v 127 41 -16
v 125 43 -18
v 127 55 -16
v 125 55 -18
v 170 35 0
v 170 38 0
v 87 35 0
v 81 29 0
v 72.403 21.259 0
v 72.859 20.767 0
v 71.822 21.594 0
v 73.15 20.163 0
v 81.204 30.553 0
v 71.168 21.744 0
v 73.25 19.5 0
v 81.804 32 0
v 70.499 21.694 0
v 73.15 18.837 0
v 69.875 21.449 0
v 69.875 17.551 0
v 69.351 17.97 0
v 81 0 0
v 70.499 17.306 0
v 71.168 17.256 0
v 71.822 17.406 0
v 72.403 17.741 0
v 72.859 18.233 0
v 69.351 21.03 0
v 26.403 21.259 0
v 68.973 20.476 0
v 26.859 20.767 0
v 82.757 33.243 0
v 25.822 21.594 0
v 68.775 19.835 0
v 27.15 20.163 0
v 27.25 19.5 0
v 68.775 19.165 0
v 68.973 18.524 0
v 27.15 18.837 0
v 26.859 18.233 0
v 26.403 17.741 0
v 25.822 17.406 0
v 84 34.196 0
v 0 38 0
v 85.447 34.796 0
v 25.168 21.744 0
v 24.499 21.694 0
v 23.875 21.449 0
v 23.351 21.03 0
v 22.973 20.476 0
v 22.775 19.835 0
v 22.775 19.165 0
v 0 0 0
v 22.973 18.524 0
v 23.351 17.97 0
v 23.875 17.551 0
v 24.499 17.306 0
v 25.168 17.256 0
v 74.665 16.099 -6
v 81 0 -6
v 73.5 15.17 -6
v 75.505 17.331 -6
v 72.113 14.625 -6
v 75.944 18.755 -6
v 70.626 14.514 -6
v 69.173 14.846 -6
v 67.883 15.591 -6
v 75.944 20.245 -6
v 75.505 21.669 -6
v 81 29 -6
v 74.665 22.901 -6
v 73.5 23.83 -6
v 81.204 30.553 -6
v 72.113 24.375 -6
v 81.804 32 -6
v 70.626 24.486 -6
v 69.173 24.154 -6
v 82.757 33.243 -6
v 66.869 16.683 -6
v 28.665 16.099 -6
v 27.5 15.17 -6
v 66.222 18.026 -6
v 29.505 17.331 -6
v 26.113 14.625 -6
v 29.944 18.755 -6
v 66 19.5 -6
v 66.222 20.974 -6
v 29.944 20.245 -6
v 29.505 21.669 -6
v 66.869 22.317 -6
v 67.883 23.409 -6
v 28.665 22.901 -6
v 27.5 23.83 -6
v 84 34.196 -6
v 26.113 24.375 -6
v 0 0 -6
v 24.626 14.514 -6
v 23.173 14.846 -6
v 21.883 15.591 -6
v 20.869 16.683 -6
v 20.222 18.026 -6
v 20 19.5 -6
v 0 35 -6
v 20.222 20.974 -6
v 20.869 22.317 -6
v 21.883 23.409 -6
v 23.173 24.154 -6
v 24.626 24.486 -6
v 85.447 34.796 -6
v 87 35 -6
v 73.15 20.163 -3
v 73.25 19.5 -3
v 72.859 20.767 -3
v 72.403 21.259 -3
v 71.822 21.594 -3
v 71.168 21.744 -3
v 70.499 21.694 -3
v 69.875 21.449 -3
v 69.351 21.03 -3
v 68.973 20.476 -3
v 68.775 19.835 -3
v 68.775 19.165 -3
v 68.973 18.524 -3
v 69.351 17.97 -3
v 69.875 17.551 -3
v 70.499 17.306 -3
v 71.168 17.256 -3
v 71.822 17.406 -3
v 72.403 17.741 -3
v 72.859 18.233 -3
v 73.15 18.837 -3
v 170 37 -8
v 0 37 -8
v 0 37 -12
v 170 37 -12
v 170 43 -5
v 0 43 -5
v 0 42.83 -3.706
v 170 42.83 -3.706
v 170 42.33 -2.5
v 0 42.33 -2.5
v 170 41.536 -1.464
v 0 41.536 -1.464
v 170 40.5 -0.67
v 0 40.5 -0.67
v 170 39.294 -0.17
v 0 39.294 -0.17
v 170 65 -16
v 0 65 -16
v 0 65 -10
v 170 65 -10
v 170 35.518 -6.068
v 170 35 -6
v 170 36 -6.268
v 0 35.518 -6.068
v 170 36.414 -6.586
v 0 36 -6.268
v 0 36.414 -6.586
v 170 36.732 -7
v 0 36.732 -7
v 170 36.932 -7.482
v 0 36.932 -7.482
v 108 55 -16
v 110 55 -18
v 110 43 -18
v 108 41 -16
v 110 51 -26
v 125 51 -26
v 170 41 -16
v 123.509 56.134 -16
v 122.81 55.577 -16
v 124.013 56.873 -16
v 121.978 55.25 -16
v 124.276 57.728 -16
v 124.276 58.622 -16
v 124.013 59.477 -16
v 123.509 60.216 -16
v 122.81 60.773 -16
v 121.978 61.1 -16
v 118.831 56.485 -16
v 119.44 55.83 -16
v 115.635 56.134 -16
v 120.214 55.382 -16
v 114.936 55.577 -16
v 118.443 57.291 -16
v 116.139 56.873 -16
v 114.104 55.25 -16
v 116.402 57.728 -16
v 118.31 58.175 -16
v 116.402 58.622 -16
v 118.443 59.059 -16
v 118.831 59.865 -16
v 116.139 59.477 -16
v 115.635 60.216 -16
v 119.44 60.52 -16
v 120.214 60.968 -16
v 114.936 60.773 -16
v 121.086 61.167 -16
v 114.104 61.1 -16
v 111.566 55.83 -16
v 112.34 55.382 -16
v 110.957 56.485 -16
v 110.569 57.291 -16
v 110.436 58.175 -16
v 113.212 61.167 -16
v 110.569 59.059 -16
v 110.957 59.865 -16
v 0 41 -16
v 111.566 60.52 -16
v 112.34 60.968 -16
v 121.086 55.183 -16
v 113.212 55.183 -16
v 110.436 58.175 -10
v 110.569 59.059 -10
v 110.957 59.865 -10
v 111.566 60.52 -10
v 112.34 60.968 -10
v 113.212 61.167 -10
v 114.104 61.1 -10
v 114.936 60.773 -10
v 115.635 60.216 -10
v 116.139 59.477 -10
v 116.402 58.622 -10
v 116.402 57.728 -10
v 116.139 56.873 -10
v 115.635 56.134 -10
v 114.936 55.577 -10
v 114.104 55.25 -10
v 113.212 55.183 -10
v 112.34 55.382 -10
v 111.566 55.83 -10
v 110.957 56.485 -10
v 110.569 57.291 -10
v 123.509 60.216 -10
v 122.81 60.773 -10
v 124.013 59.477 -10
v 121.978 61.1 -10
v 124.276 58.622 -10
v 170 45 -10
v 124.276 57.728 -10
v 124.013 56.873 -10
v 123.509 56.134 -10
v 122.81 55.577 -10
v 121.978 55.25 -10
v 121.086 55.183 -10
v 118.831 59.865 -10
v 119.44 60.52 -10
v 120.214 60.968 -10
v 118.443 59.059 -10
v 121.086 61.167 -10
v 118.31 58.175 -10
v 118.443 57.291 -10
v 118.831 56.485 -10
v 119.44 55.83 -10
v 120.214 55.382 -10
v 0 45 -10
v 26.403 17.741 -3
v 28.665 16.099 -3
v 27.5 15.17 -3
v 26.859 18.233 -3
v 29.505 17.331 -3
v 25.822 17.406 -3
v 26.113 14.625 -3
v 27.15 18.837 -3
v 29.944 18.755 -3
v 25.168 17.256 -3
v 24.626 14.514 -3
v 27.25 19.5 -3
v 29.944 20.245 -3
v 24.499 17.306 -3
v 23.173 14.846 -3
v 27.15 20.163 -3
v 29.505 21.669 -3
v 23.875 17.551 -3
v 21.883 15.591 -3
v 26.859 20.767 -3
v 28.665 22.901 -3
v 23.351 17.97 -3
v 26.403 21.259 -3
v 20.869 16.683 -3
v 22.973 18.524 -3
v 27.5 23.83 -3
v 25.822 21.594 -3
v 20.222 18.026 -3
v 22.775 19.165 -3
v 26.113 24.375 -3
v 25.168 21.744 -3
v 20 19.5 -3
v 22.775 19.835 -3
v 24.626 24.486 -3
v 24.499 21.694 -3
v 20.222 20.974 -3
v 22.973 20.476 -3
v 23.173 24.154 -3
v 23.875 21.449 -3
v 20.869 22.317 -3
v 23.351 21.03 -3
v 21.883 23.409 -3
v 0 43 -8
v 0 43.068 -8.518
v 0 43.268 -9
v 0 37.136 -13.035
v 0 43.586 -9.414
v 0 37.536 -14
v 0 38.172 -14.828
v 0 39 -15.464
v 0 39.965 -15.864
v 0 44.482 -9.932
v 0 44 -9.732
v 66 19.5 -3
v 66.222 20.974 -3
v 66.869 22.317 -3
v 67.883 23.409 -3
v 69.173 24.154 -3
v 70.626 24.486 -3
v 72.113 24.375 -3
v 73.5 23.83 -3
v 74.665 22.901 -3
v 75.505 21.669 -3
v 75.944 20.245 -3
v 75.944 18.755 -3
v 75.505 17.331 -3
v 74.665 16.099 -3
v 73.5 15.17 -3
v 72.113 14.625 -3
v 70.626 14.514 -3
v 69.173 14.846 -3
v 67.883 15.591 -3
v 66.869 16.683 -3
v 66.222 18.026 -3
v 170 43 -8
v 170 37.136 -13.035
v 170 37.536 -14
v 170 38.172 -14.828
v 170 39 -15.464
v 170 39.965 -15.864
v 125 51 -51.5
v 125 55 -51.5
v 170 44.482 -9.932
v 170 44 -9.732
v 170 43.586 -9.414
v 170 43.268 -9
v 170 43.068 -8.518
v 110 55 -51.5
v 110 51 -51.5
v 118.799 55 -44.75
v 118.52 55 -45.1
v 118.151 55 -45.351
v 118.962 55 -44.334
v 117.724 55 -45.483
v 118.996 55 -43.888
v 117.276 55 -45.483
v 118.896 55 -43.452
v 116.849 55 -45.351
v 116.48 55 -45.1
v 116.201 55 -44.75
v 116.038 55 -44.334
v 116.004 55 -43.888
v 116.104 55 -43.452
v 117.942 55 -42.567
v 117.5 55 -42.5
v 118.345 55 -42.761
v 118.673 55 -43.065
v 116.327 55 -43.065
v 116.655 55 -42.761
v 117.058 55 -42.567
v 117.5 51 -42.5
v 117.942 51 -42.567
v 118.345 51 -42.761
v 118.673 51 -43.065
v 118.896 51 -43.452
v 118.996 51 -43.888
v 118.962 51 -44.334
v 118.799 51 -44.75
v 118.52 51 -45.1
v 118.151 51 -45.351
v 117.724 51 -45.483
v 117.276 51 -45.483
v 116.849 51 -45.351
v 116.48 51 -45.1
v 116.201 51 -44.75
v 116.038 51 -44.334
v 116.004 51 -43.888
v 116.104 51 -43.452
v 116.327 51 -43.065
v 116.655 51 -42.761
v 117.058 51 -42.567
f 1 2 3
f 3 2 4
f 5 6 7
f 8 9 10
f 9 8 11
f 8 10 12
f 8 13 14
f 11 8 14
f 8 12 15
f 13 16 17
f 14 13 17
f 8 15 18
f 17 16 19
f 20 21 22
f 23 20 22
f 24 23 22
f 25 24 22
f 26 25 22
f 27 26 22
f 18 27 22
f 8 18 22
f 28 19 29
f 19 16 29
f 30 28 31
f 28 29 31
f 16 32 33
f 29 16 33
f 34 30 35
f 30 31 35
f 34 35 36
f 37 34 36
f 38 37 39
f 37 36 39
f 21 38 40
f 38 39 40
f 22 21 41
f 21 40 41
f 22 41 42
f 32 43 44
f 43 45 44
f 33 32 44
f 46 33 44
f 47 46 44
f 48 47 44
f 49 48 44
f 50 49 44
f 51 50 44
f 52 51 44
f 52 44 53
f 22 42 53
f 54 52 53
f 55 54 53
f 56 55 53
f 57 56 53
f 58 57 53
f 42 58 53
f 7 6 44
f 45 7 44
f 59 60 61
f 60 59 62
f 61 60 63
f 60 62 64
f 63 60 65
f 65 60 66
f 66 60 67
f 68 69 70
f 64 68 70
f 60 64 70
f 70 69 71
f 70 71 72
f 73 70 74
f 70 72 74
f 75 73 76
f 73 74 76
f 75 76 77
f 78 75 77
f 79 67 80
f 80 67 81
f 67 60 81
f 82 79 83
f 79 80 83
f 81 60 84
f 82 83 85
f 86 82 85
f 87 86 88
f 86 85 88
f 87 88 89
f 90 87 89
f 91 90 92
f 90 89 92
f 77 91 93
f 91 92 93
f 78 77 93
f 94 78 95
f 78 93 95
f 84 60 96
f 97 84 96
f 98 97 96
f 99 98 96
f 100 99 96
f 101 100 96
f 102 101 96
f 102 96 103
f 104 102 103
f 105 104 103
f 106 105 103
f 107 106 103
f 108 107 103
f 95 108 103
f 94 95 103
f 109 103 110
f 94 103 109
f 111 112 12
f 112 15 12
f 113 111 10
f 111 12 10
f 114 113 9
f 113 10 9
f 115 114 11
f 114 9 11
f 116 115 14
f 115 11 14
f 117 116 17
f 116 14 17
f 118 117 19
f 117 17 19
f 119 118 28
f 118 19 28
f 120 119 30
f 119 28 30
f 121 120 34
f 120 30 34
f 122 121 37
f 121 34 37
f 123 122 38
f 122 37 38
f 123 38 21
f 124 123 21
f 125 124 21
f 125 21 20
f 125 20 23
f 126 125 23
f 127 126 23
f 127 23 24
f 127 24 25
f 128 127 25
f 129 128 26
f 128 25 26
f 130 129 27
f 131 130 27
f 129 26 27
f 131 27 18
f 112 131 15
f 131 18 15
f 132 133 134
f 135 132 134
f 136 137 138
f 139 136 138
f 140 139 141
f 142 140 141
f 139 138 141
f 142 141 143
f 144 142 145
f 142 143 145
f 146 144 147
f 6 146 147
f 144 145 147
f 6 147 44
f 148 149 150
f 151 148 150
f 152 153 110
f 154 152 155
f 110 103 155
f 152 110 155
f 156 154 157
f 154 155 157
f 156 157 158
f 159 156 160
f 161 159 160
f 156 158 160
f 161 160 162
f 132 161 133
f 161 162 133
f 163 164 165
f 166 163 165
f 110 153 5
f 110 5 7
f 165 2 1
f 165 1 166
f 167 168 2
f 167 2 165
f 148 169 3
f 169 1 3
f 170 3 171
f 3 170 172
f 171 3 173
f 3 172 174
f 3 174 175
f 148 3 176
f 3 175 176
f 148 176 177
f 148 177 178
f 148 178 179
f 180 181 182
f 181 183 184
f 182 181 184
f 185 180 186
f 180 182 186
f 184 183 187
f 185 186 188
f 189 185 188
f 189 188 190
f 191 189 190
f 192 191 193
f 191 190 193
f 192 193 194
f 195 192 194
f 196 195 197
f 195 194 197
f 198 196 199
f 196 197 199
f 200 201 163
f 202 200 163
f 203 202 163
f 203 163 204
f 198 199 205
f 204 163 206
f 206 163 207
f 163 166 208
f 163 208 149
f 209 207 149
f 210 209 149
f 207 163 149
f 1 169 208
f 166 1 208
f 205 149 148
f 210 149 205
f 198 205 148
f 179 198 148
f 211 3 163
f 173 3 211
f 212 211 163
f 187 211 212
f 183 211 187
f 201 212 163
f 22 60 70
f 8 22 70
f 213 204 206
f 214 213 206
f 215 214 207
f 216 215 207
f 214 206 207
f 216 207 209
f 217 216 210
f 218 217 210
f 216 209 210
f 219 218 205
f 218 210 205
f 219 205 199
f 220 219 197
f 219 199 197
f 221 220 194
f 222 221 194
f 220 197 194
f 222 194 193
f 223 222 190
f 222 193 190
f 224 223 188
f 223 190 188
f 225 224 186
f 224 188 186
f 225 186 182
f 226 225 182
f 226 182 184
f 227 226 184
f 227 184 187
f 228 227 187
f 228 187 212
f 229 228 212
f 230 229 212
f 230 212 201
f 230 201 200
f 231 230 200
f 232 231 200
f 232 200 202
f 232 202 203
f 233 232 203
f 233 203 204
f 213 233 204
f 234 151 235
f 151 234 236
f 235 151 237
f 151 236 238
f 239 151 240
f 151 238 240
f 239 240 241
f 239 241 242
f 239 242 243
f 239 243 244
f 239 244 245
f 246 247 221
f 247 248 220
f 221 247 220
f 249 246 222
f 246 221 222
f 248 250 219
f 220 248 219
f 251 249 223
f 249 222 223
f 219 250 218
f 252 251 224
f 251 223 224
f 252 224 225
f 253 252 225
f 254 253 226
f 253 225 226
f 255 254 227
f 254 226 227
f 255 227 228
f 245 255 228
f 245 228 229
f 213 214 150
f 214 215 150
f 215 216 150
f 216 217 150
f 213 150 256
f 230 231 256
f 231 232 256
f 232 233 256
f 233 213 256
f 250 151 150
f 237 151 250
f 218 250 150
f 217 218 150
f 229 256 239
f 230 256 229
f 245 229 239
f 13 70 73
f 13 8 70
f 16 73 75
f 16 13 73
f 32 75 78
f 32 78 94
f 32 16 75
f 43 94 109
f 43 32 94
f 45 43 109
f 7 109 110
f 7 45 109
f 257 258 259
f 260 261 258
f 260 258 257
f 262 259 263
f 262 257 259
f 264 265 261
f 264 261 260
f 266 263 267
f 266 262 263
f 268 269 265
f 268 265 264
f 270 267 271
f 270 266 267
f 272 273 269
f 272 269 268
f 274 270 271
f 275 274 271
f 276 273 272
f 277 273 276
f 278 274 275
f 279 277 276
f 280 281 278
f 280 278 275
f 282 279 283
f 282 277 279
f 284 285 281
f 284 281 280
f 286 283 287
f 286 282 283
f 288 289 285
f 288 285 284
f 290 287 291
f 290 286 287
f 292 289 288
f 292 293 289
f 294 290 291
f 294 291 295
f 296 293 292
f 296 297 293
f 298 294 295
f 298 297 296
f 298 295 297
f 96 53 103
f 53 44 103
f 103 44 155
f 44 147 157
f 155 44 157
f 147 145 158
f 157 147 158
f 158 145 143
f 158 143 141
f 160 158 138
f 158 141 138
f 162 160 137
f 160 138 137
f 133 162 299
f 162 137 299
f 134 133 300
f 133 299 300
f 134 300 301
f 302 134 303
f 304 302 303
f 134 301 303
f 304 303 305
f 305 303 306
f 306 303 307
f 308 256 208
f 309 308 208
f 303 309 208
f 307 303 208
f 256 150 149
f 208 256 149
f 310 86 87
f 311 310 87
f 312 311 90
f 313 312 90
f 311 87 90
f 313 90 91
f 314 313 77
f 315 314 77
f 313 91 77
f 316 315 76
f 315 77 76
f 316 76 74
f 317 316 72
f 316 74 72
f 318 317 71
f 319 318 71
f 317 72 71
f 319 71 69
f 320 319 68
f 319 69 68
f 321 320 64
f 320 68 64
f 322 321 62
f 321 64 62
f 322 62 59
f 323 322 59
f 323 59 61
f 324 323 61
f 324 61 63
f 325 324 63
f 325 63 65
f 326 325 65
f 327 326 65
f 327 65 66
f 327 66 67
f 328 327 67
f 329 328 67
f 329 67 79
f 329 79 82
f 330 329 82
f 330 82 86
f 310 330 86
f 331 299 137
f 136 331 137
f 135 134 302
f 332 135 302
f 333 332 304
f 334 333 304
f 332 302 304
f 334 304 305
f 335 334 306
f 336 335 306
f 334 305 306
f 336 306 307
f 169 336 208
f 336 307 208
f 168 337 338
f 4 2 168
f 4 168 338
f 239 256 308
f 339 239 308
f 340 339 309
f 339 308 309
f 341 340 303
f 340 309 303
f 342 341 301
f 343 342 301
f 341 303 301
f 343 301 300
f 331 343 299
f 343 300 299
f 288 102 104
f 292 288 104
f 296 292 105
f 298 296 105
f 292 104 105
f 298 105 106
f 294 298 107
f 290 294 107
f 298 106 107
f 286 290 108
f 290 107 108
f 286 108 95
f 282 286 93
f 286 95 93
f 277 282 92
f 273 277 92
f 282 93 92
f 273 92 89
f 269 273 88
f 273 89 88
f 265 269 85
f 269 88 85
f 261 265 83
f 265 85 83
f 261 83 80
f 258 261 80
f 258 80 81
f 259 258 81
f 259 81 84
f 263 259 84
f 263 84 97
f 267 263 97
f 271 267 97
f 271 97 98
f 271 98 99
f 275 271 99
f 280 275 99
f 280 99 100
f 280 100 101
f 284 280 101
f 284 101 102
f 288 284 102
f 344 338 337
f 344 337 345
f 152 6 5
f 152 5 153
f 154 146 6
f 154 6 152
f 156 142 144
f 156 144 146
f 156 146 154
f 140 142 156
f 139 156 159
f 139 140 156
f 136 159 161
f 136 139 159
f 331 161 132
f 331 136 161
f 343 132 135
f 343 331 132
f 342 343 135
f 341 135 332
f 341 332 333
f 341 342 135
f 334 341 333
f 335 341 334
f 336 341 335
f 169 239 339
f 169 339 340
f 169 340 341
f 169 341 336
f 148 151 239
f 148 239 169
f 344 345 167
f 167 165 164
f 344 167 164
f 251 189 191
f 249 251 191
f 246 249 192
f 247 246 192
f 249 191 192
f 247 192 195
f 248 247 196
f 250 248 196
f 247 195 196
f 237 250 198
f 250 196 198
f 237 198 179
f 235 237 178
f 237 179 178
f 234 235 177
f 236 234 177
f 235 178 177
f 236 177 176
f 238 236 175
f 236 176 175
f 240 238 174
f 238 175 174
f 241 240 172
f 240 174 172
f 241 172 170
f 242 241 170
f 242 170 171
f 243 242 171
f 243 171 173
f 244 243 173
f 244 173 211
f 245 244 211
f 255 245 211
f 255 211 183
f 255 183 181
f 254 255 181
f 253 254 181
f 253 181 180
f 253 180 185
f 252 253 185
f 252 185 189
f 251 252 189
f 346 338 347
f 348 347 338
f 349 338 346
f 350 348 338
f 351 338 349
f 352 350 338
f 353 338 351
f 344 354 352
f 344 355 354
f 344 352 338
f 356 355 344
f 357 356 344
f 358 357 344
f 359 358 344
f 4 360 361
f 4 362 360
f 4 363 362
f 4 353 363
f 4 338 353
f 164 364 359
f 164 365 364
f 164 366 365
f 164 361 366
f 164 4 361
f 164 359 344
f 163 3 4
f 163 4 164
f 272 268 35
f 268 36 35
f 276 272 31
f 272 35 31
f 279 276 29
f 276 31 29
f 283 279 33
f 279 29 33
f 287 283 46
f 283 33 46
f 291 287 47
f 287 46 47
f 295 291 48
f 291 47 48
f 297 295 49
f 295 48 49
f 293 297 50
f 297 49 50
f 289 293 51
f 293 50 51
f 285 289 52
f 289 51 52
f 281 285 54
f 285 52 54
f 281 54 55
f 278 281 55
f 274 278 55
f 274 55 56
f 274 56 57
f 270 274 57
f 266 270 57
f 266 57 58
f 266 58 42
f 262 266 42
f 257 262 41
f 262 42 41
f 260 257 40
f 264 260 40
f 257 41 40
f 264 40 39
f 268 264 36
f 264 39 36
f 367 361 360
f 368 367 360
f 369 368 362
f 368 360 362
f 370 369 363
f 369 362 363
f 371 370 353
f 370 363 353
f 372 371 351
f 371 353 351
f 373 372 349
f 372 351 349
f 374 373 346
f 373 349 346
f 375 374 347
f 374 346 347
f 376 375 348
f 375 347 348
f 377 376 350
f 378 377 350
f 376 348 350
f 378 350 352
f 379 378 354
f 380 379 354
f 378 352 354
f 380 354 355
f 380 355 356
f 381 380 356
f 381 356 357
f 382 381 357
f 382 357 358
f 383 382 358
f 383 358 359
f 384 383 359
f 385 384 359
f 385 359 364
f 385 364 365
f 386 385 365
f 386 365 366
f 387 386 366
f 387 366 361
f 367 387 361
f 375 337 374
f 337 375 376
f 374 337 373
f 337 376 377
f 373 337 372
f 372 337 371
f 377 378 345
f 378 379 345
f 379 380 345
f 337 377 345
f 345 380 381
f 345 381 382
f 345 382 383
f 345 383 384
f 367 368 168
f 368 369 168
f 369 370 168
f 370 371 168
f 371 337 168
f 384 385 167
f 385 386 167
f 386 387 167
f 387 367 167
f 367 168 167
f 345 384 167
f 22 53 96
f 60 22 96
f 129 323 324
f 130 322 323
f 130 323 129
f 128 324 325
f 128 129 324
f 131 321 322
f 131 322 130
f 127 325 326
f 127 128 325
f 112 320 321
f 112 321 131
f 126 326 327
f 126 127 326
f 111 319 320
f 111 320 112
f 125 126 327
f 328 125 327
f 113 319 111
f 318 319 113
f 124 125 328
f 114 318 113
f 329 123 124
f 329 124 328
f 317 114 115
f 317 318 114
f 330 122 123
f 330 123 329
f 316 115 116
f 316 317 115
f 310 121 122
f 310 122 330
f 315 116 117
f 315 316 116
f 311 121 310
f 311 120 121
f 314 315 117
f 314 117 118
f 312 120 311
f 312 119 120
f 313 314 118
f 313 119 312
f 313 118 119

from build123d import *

# Parameters (mm, degrees)
ESTRUSIONE_ESTRUSIONE1_DEPTH                         = 170
FORO_LAMATO_PER_BULLONE_M5_A_TESTA_ESAGO_D           = 4.5
FORO_LAMATO_PER_BULLONE_M5_A_TESTA_ESAGO_DEPTH       = 30
FORO_LAMATO_PER_BULLONE_M5_A_TESTA_ESAGO_CBORE_D     = 10
FORO_LAMATO_PER_BULLONE_M5_A_TESTA_ESAGO_CBORE_DEPTH = 3
FORO_LAMATO_PER_BULLONE_M5_A_TESTA_ESAGO_TIP         = 1.351936393
SCHIZZO4_W                                           = 89
SCHIZZO4_H                                           = 35
TAGLIO_ESTRUSIONE1_DEPTH                             = 170
RACCORDO1_R                                          = 6
SCHIZZO5_W                                           = 15
SCHIZZO5_H                                           = 4
ESTRUSIONE_ESTRUSIONE2_DEPTH                         = 35.5
SCHIZZO6_R                                           = 1.5
TAGLIO_ESTRUSIONE2_DEPTH                             = 32
SCHIZZO7_R                                           = 3
TAGLIO_ESTRUSIONE3_DEPTH                             = 10
SMUSSO1_SIZE                                         = 10
SMUSSO2_SIZE                                         = 2


with BuildPart() as part:
    # Schizzo1 → Estrusione-Estrusione1 (new body)
    with BuildSketch(Plane(origin=(0, 0, 0), x_dir=(0, 0, -1), z_dir=(1, 0, 0))):
        with BuildLine():
            Line((0, 0), (6, 0))
            Line((6, 0), (6, 35))
            ThreePointArc((6, 35), (6.585786438, 36.414213562), (8, 37))
            Line((8, 37), (12, 37))
            ThreePointArc((12, 37), (14.828427125, 38.171572875), (16, 41))
            Line((16, 41), (16, 65))
            Line((16, 65), (10, 65))
            Line((10, 65), (10, 45))
            ThreePointArc((10, 45), (9.414213562, 43.585786438), (8, 43))
            Line((8, 43), (5, 43))
            ThreePointArc((5, 43), (1.464466094, 41.535533906), (0, 38))
            Line((0, 38), (0, 0))
        make_face()
    extrude(amount=ESTRUSIONE_ESTRUSIONE1_DEPTH)

    # Foro lamato per Bullone M5 a testa esagonale-1
    with Locations(Plane(origin=(0, 0, -6), x_dir=(-1, 0, 0), z_dir=(0, 0, -1))):
        with Locations((-25, 19.5), (-71, 19.5)):
            CounterBoreHole(FORO_LAMATO_PER_BULLONE_M5_A_TESTA_ESAGO_D / 2, FORO_LAMATO_PER_BULLONE_M5_A_TESTA_ESAGO_CBORE_D / 2, FORO_LAMATO_PER_BULLONE_M5_A_TESTA_ESAGO_CBORE_DEPTH, depth=FORO_LAMATO_PER_BULLONE_M5_A_TESTA_ESAGO_DEPTH)
            with Locations((0, 0, -(FORO_LAMATO_PER_BULLONE_M5_A_TESTA_ESAGO_DEPTH + FORO_LAMATO_PER_BULLONE_M5_A_TESTA_ESAGO_TIP / 2))):  # 118° drill point
                Cone(0, FORO_LAMATO_PER_BULLONE_M5_A_TESTA_ESAGO_D / 2, FORO_LAMATO_PER_BULLONE_M5_A_TESTA_ESAGO_TIP, mode=Mode.SUBTRACT)

    # Schizzo4 → Taglio-Estrusione1 (cut)
    with BuildSketch(Plane(origin=(0, 0, -6), x_dir=(-1, 0, 0), z_dir=(0, 0, -1))):
        with Locations((-125.5, 17.5)):
            Rectangle(SCHIZZO4_W, SCHIZZO4_H)
    extrude(amount=-TAGLIO_ESTRUSIONE1_DEPTH, mode=Mode.SUBTRACT)

    # Raccordo1
    raccordo1_edges = [part.edges().sort_by_distance(p)[0] for p in [
        (81, 35, -3),
    ]]
    fillet(raccordo1_edges, radius=RACCORDO1_R)

    # Schizzo5 → Estrusione-Estrusione2 (add)
    with BuildSketch(Plane(origin=(0, 0, -16), x_dir=(-1, 0, 0), z_dir=(0, 0, -1))):
        with Locations((-117.5, 53)):
            Rectangle(SCHIZZO5_W, SCHIZZO5_H)
    extrude(amount=ESTRUSIONE_ESTRUSIONE2_DEPTH)

    # Schizzo6 → Taglio-Estrusione2 (cut)
    with BuildSketch(Plane(origin=(0, 55, 0), x_dir=(1, 0, 0), z_dir=(0, 1, 0))):
        with Locations(Location((117.5, 44, 0), (0, 0, 270))):
            Circle(SCHIZZO6_R)
    extrude(amount=-TAGLIO_ESTRUSIONE2_DEPTH, mode=Mode.SUBTRACT)

    # Schizzo7 → Taglio-Estrusione3 (cut)
    with BuildSketch(Plane(origin=(0, 0, -16), x_dir=(-1, 0, 0), z_dir=(0, 0, -1))):
        with Locations((-121.31, 58.175)):
            Circle(SCHIZZO7_R)
        with Locations((-113.436, 58.175)):
            Circle(SCHIZZO7_R)
    extrude(amount=-TAGLIO_ESTRUSIONE3_DEPTH, mode=Mode.SUBTRACT)

    # Smusso1
    smusso1_edges = [part.edges().sort_by_distance(p)[0] for p in [
        (117.5, 51, -16),
    ]]
    chamfer(smusso1_edges, length=SMUSSO1_SIZE - 0.0001)  # a hair under: the kernel refuses the full size

    # Smusso2
    smusso2_edges = [part.edges().sort_by_distance(p)[0] for p in [
        (110, 48.00005, -16),
        (125, 48.00005, -16),
    ]]
    chamfer(smusso2_edges, length=SMUSSO2_SIZE)


solid = part.part
